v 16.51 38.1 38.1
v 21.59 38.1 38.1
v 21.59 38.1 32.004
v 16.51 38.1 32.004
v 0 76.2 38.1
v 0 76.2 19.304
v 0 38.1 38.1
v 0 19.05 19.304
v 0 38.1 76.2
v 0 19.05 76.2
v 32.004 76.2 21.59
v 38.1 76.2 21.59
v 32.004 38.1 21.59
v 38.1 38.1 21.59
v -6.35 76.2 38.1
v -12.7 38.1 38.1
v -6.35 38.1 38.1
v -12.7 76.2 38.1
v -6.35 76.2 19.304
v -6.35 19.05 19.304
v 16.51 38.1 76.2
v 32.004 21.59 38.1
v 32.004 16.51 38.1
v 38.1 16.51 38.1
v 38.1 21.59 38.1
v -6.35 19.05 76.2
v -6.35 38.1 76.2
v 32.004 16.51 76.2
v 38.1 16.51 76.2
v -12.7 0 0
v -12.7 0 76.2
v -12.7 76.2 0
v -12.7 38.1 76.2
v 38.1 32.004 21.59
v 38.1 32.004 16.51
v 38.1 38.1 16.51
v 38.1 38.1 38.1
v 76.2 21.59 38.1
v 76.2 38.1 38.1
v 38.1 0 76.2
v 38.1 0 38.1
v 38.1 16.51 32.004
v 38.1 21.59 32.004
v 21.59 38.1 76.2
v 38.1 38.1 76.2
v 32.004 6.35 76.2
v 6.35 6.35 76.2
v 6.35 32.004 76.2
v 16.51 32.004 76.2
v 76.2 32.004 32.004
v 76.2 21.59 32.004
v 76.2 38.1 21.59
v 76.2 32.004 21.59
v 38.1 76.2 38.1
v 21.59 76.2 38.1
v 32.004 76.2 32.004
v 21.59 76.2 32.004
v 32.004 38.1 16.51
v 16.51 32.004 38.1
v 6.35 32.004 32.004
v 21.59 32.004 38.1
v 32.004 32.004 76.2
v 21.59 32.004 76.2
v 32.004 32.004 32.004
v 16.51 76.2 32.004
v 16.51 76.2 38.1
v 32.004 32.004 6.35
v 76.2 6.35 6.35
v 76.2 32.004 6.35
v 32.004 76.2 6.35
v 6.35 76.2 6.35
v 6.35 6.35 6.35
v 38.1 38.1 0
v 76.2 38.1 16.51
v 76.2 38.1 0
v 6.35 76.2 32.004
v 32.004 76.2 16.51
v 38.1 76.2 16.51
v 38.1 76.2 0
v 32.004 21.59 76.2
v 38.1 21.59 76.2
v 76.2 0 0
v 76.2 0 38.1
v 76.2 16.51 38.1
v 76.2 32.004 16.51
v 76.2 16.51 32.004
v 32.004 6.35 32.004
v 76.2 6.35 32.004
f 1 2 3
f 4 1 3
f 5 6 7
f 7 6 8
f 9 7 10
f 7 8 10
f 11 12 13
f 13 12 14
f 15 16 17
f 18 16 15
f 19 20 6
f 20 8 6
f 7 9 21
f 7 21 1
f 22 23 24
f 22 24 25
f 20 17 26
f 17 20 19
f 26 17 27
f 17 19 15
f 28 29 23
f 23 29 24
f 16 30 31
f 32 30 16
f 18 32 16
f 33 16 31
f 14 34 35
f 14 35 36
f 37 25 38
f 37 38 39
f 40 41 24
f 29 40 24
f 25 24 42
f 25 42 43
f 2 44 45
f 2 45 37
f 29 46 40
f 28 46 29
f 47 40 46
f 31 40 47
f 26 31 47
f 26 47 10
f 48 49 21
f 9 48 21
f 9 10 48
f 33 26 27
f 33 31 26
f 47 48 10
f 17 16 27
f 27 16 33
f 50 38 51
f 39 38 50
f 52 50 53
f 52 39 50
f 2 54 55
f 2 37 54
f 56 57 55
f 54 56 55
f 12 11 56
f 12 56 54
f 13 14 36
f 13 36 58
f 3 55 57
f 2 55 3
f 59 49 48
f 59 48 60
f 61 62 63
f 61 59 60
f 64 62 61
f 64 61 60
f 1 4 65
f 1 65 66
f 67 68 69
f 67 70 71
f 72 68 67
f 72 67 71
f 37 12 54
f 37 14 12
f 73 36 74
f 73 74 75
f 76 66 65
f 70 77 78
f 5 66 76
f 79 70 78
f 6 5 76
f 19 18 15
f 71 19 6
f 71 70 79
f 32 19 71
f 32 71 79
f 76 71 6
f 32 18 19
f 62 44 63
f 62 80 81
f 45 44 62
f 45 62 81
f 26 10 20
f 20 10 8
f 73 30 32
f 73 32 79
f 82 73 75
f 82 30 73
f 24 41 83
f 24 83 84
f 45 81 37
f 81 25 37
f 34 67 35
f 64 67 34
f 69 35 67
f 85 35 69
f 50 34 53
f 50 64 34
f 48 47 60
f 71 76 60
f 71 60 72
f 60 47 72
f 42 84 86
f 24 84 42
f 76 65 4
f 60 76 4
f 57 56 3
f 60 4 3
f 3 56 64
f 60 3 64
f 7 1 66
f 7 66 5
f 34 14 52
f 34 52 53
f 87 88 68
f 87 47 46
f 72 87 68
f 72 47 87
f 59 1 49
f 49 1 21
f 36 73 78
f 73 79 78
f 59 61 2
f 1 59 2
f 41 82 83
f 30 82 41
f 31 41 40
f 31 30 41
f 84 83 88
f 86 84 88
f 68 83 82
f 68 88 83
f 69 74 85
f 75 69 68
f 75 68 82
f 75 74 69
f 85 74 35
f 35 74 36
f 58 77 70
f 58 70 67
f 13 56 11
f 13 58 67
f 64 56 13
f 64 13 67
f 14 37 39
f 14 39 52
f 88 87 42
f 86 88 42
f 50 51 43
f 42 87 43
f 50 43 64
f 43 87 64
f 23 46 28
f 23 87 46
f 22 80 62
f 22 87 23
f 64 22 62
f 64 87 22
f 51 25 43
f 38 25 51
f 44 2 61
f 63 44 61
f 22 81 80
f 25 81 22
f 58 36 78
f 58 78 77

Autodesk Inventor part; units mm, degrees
ref_plane "YZ Plane" through (0, 0, 0) normal (1, 0, 0) x (0, 1, 0)
ref_plane "XZ Plane" through (0, 0, 0) normal (0, 1, 0) x (-1, 0, 0)
ref_plane "XY Plane" through (0, 0, 0) normal (0, 0, 1) x (1, 0, 0)
sketch "Sketch1" plane through (0, 0, 0) normal (0, 0, 1) x (1, 0, 0)
  line L0 (0, 0) -> (38.1, 0)
  line L1 (38.1, 0) -> (38.1, 38.1)
  line L2 (38.1, 38.1) -> (0, 38.1)
  line L3 (0, 38.1) -> (0, 0)
  dimension "d0" = 38.1
  dimension "d1" = 38.1
extrude "Extrusion1" add sketch "Sketch1" along normal blind 38.1
sketch "Sketch2" plane through (0, 0, 38.1) normal (0, 0, 1) x (1, 0, 0)
  line L0 (6.35, 6.35) -> (32.004, 6.35)
  line L1 (32.004, 6.35) -> (32.004, 32.004)
  line L2 (32.004, 32.004) -> (6.35, 32.004)
  line L3 (6.35, 32.004) -> (6.35, 6.35)
  line L4 (38.1, 0) -> (38.1, 38.1) projected
  line L5 (0, 0) -> (38.1, 0)
  line L6 (38.1, 0) -> (38.1, 38.1)
  line L7 (38.1, 38.1) -> (0, 38.1)
  line L8 (0, 38.1) -> (0, 0)
  dimension "d4" = 25.654
  dimension "d5" = 25.654
extrude "Extrusion2" cut sketch "Sketch2" against normal blind 31.75 contours L3 L2 L1 L0
sketch "Sketch5" plane through (0, 0, 38.1) normal (0, 0, 1) x (1, 0, 0)
  line L0 (6.35, 6.35) -> (6.35, 32.004) projected
  line L1 (6.35, 6.35) -> (32.004, 6.35)
  line L2 (32.004, 6.35) -> (32.004, 32.004)
  line L3 (32.004, 32.004) -> (6.35, 32.004)
  line L4 (6.35, 32.004) -> (6.35, 6.35)
  line L5 (0, 0) -> (38.1, 0) projected
  line L6 (0, 0) -> (38.1, 0)
  line L7 (38.1, 0) -> (38.1, 38.1)
  line L8 (38.1, 38.1) -> (0, 38.1)
  line L9 (0, 38.1) -> (0, 0)
extrude "Extrusion4" add sketch "Sketch5" along normal blind 38.1
sketch "Sketch7" plane through (38.1, 0, 0) normal (1, 0, 0) x (0, 0, -1)
  line L0 (0, 0) -> (-76.2, 0) projected
  line L1 (0, 0) -> (-38.1, 0)
  line L2 (-38.1, 0) -> (-38.1, 38.1)
  line L3 (-38.1, 38.1) -> (0, 38.1)
  line L4 (0, 38.1) -> (0, 0)
  line L5 (-76.2, 6.35) -> (-6.35, 6.35) projected
  line L6 (-6.35, 6.35) -> (-32.004, 6.35)
  line L7 (-32.004, 6.35) -> (-32.004, 32.004)
  line L8 (-32.004, 32.004) -> (-6.35, 32.004)
  line L9 (-6.35, 32.004) -> (-6.35, 6.35)
  dimension "d16" = 38.1
  dimension "d17" = 38.1
  dimension "d20" = 25.654
  dimension "d21" = 25.654
extrude "Extrusion6" add sketch "Sketch7" along normal blind 38.1
sketch "Sketch9" plane through (38.1, 6.35, 6.35) normal (1, 0, 0) x (0, 0, -1)
  line L0 (-25.654, 0) -> (-25.654, 25.654) projected
  line L1 (0, 0) -> (0, 25.654) projected
  line L2 (-25.654, 0) -> (0, 0)
  line L3 (0, 0) -> (0, 25.654)
  line L4 (0, 25.654) -> (-25.654, 25.654)
  line L5 (-25.654, 25.654) -> (-25.654, 0)
  point P0 (6.35, -6.35)
extrude "Extrusion7" cut sketch "Sketch9" against normal blind 31.75
sketch "Sketch10" plane through (0, 38.1, 76.2) normal (0, 1, 0) x (1, 0, 0)
  line L0 (76.2, 69.85) -> (6.35, 69.85) projected
  line L1 (6.35, 69.85) -> (32.004, 69.85)
  line L2 (32.004, 69.85) -> (32.004, 44.196)
  line L3 (32.004, 44.196) -> (6.35, 44.196)
  line L4 (6.35, 44.196) -> (6.35, 69.85)
  line L5 (38.1, 38.1) -> (38.1, 0) projected
  line L6 (0, 76.2) -> (0, 0) projected
  line L7 (38.1, 38.1) -> (0, 38.1)
  line L8 (0, 38.1) -> (0, 76.2)
  line L9 (0, 76.2) -> (38.1, 76.2)
  line L10 (38.1, 76.2) -> (38.1, 38.1)
  point P0 (0, 38.1)
  dimension "d26" = 25.654
  dimension "d27" = 25.654
extrude "Extrusion8" add sketch "Sketch10" along normal blind 38.1
sketch "Sketch11" plane through (6.35, 38.1, 6.35) normal (0, 1, 0) x (1, 0, 0)
  line L0 (0, -25.654) -> (25.654, -25.654) projected
  line L1 (25.654, -25.654) -> (0, -25.654)
  line L2 (0, -25.654) -> (0, 0)
  line L3 (0, 0) -> (25.654, 0)
  line L4 (25.654, 0) -> (25.654, -25.654)
  point P0 (-6.35, 6.35)
extrude "Extrusion9" cut sketch "Sketch11" against normal blind 6.35
sketch "Sketch12" plane through (0, 76.2, 76.2) normal (0, 1, 0) x (1, 0, 0)
  line L0 (38.1, 55.88) -> (32.004, 55.88)
  line L1 (32.004, 55.88) -> (32.004, 58.42)
  line L2 (32.004, 58.42) -> (38.1, 58.42)
  line L3 (38.1, 58.42) -> (38.1, 55.88)
  point P0 (0, 76.2)
  dimension "d32" = 6.096
  dimension "d33" = 2.54
extrude "Extrusion10" cut sketch "Sketch12" against normal blind 38.1
sketch "Sketch13" plane through (76.2, 38.1, 38.1) normal (0, 1, 0) x (1, 0, 0)
  line L0 (0, 31.75) -> (0, 6.096) projected
  line L1 (-44.196, 17.78) -> (0, 17.78)
  line L2 (0, 17.78) -> (0, 20.32)
  line L3 (0, 20.32) -> (-44.196, 20.32)
  line L4 (-44.196, 20.32) -> (-44.196, 17.78)
  point P0 (-76.2, 38.1)
  dimension "d36" = 2.54
extrude "Extrusion11" cut sketch "Sketch13" against normal blind 6.35
sketch "Sketch15" plane through (0, 76.2, 76.2) normal (0, 1, 0) x (1, 0, 0)
  line L0 (17.78, 38.1) -> (20.32, 38.1)
  line L1 (20.32, 38.1) -> (20.32, 44.196)
  line L2 (20.32, 44.196) -> (17.78, 44.196)
  line L3 (17.78, 44.196) -> (17.78, 38.1)
  point P0 (0, 76.2)
  dimension "d39" = 2.54
  dimension "d40" = 6.096
extrude "Extrusion12" cut sketch "Sketch15" against normal blind 38.1
sketch "Sketch16" plane through (0, 38.1, 76.2) normal (0, 1, 0) x (1, 0, 0)
  line L0 (20.32, 44.196) -> (20.32, 38.1) projected
  line L1 (0, 0) -> (38.1, 0) projected
  line L2 (20.32, 44.196) -> (17.78, 44.196)
  line L3 (17.78, 44.196) -> (17.78, 0)
  line L4 (17.78, 0) -> (20.32, 0)
  line L5 (20.32, 0) -> (20.32, 44.196)
  point P0 (0, 76.2)
  dimension "d43" = 2.54
extrude "Extrusion13" cut sketch "Sketch16" against normal blind 6.35
sketch "Sketch17" plane through (38.1, 0, 76.2) normal (1, 0, 0) x (0, 0, -1)
  line L0 (38.1, 0) -> (38.1, 38.1) projected
  line L1 (0, 17.78) -> (38.1, 17.78)
  line L2 (38.1, 17.78) -> (38.1, 20.32)
  line L3 (38.1, 20.32) -> (0, 20.32)
  line L4 (0, 20.32) -> (0, 17.78)
  point P0 (76.2, 0)
  dimension "d46" = 2.54
extrude "Extrusion14" cut sketch "Sketch17" against normal blind 6.35
sketch "Sketch18" plane through (38.1, 0, 38.1) normal (0, 0, 1) x (1, 0, 0)
  line L0 (0, 17.78) -> (38.1, 17.78)
  line L1 (38.1, 17.78) -> (38.1, 20.32)
  line L2 (38.1, 20.32) -> (0, 20.32)
  line L3 (0, 20.32) -> (0, 17.78)
  point P0 (-38.1, 0)
  dimension "d49" = 38.1
  dimension "d50" = 2.54
extrude "Extrusion15" cut sketch "Sketch18" against normal blind 6.35
sketch "Sketch20" plane through (38.1, 38.1, 38.1) normal (0, 0, 1) x (1, 0, 0)
  line L0 (-17.78, -6.096) -> (-17.78, 38.1) projected
  line L1 (0, 0) -> (-17.78, 0) projected
  line L2 (-17.78, 38.1) -> (-16.51, 38.1)
  line L3 (-16.51, 38.1) -> (-16.51, 0)
  line L4 (-16.51, 0) -> (-17.78, 0)
  line L5 (-17.78, 0) -> (-17.78, 38.1)
  point P0 (-38.1, -38.1)
  dimension "d53" = 1.27
extrude "Extrusion16" cut sketch "Sketch20" against normal blind 6.35
sketch "Sketch21" plane through (38.1, 38.1, 76.2) normal (0, 1, 0) x (1, 0, 0)
  line L0 (-17.78, 0) -> (-17.78, 44.196) projected
  line L1 (0, 0) -> (-17.78, 0) projected
  line L2 (-17.78, 44.196) -> (-16.51, 44.196)
  line L3 (-16.51, 44.196) -> (-16.51, 0)
  line L4 (-16.51, 0) -> (-17.78, 0)
  line L5 (-17.78, 0) -> (-17.78, 44.196)
  point P0 (-38.1, 76.2)
  dimension "d56" = 1.27
extrude "Extrusion17" cut sketch "Sketch21" against normal blind 6.35
sketch "Sketch23" plane through (0, 38.1, 38.1) normal (0, 0, 1) x (1, 0, 0)
  line L0 (17.78, 0) -> (17.78, 38.1) projected
  line L1 (17.78, 0) -> (0, 0) projected
  line L2 (17.78, 38.1) -> (16.51, 38.1)
  line L3 (16.51, 38.1) -> (16.51, 0)
  line L4 (16.51, 0) -> (17.78, 0)
  line L5 (17.78, 0) -> (17.78, 38.1)
  point P0 (0, -38.1)
  dimension "d59" = 1.27
extrude "Extrusion18" cut sketch "Sketch23" against normal blind 6.35
sketch "Sketch24" plane through (0, 38.1, 76.2) normal (0, 1, 0) x (1, 0, 0)
  line L0 (17.78, 44.196) -> (17.78, 0) projected
  line L1 (17.78, 0) -> (0, 0) projected
  line L2 (17.78, 44.196) -> (16.51, 44.196)
  line L3 (16.51, 44.196) -> (16.51, 0)
  line L4 (16.51, 0) -> (17.78, 0)
  line L5 (17.78, 0) -> (17.78, 44.196)
  point P0 (0, 76.2)
  dimension "d62" = 1.27
extrude "Extrusion19" cut sketch "Sketch24" against normal blind 6.35
sketch "Sketch25" plane through (38.1, 0, 76.2) normal (1, 0, 0) x (0, 0, -1)
  line L0 (38.1, 0) -> (38.1, 17.78) projected
  line L1 (38.1, 17.78) -> (0, 17.78)
  line L2 (0, 17.78) -> (0, 16.51)
  line L3 (0, 16.51) -> (38.1, 16.51)
  line L4 (38.1, 16.51) -> (38.1, 17.78)
  point P0 (76.2, 0)
  dimension "d65" = 38.1
  dimension "d66" = 1.27
extrude "Extrusion20" cut sketch "Sketch25" against normal blind 6.35
sketch "Sketch26" plane through (38.1, 38.1, 76.2) normal (1, 0, 0) x (0, 0, -1)
  line L0 (0, -17.78) -> (38.1, -17.78) projected
  line L1 (38.1, -17.78) -> (0, -17.78)
  line L2 (0, -17.78) -> (0, -16.51)
  line L3 (0, -16.51) -> (38.1, -16.51)
  line L4 (38.1, -16.51) -> (38.1, -17.78)
  point P0 (76.2, -38.1)
  dimension "d69" = 38.1
  dimension "d70" = 1.27
extrude "Extrusion21" cut sketch "Sketch26" against normal blind 6.35
sketch "Sketch27" plane through (38.1, 0, 38.1) normal (0, 0, 1) x (1, 0, 0)
  line L0 (0, 21.59) -> (0, 38.1) projected
  line L1 (0, 20.32) -> (38.1, 20.32) projected
  line L2 (0, 21.59) -> (38.1, 21.59)
  line L3 (38.1, 21.59) -> (38.1, 20.32)
  line L4 (38.1, 20.32) -> (0, 20.32)
  line L5 (0, 20.32) -> (0, 21.59)
  line L6 (38.1, 17.78) -> (0, 17.78) projected
  line L7 (0, 17.78) -> (38.1, 17.78)
  line L8 (38.1, 17.78) -> (38.1, 16.51)
  line L9 (38.1, 16.51) -> (0, 16.51)
  line L10 (0, 16.51) -> (0, 17.78)
  point P0 (-38.1, 0)
  dimension "d73" = 38.1
  dimension "d74" = 1.27
extrude "Extrusion22" cut sketch "Sketch27" against normal blind 6.35
sketch "Sketch28" plane through (38.1, 38.1, 38.1) normal (0, 1, 0) x (1, 0, 0)
  line L0 (0, 20.32) -> (38.1, 20.32) projected
  line L1 (0, 20.32) -> (38.1, 20.32)
  line L2 (38.1, 20.32) -> (38.1, 21.59)
  line L3 (38.1, 21.59) -> (0, 21.59)
  line L4 (0, 21.59) -> (0, 20.32)
  line L5 (-6.096, 17.78) -> (38.1, 17.78) projected
  line L6 (38.1, 17.78) -> (0, 17.78)
  line L7 (0, 17.78) -> (0, 16.51)
  line L8 (0, 16.51) -> (38.1, 16.51)
  line L9 (38.1, 16.51) -> (38.1, 17.78)
  point P0 (-38.1, 38.1)
  point P1 (0, 17.78)
  dimension "d77" = 38.1
  dimension "d78" = 1.27
  dimension "d79" = 38.1
  dimension "d80" = 1.27
extrude "Extrusion23" cut sketch "Sketch28" against normal blind 6.35
sketch "Sketch29" plane through (38.1, 38.1, 0) normal (1, 0, 0) x (0, 0, -1)
  line L0 (-17.78, -6.096) -> (-6.35, -6.096) projected
  line L1 (-6.35, 38.1) -> (-17.78, 38.1) projected
  line L2 (-17.78, -6.096) -> (-16.51, -6.096)
  line L3 (-16.51, -6.096) -> (-16.51, 38.1)
  line L4 (-16.51, 38.1) -> (-17.78, 38.1)
  line L5 (-17.78, 38.1) -> (-17.78, -6.096)
  line L6 (-21.59, 0) -> (-21.59, -6.096) projected
  line L7 (-20.32, 38.1) -> (-20.32, -6.096) projected
  line L8 (-21.59, -6.096) -> (-20.32, -6.096)
  line L9 (-20.32, -6.096) -> (-20.32, 38.1)
  line L10 (-20.32, 38.1) -> (-21.59, 38.1)
  line L11 (-21.59, 38.1) -> (-21.59, -6.096)
  point P0 (0, -38.1)
  point P1 (-20.32, -6.096)
  dimension "d83" = 1.27
extrude "Extrusion24" cut sketch "Sketch29" against normal blind 6.35
sketch "Sketch30" plane through (76.2, 38.1, 21.59) normal (0, 0, -1) x (-1, 0, 0)
  line L0 (0, 0) -> (38.1, 0) projected
  line L1 (44.196, 38.1) -> (44.196, -6.096) projected
  line L2 (38.1, 0) -> (44.196, 0)
  line L3 (44.196, 0) -> (44.196, -6.096)
  line L4 (44.196, -6.096) -> (38.1, -6.096)
  line L5 (38.1, -6.096) -> (38.1, 0)
  point P0 (76.2, -38.1)
  point P1 (44.196, 0)
extrude "Extrusion25" add sketch "Sketch30" along normal blind 5.08
sketch "Sketch31" plane through (21.59, 38.1, 38.1) normal (-1, 0, 0) x (0, 0, 1)
  line L0 (38.1, -6.096) -> (-6.096, -6.096) projected
  line L1 (0, 0) -> (-6.096, 0)
  line L2 (-6.096, 0) -> (-6.096, -6.096)
  line L3 (-6.096, -6.096) -> (0, -6.096)
  line L4 (0, -6.096) -> (0, 0)
  point P0 (-38.1, -38.1)
extrude "Extrusion26" add sketch "Sketch31" along normal blind 5.08
sketch "Sketch32" plane through (0, 0, 76.2) normal (-1, 0, 0) x (0, 0, 1)
  line L0 (0, 38.1) -> (0, 0) projected
  line L1 (0, 19.05) -> (-76.2, 19.05)
  line L2 (-76.2, 19.05) -> (-76.2, 0)
  line L3 (-76.2, 0) -> (0, 0)
  line L4 (0, 0) -> (0, 19.05)
  line L5 (-76.2, 0) -> (-56.896, 0)
  line L6 (-56.896, 0) -> (-56.896, 76.2)
  line L7 (-56.896, 76.2) -> (-76.2, 76.2)
  line L8 (-76.2, 76.2) -> (-76.2, 0)
  point P0 (0, 0)
  point P1 (-56.896, 19.05)
  dimension "d90" = 19.304
  dimension "d91" = 76.2
extrude "Extrusion27" add sketch "Sketch32" along normal blind 12.7
sketch "Sketch33" plane through (-12.7, 0, 76.2) normal (-1, 0, 0) x (0, 0, 1)
  line L0 (-56.896, 19.05) -> (0, 19.05) projected
  line L1 (-56.896, 19.05) -> (0, 19.05)
  line L2 (0, 19.05) -> (0, 76.2)
  line L3 (0, 76.2) -> (-56.896, 76.2)
  line L4 (-56.896, 76.2) -> (-56.896, 19.05)
  line L5 (-38.1, 38.1) -> (-38.1, 76.2) projected
  line L6 (0, 76.2) -> (-38.1, 76.2)
  line L7 (-38.1, 76.2) -> (-38.1, 38.1)
  line L8 (-38.1, 38.1) -> (0, 38.1)
  line L9 (0, 38.1) -> (0, 76.2)
  point P0 (-76.2, 0)
  dimension "d94" = 56.896
  dimension "d95" = 57.15
extrude "Extrusion28" add sketch "Sketch33" against normal blind 6.35 contours L4 L3 L5 L8 L2 L0
properties part number "corner connector w rail (back)"
